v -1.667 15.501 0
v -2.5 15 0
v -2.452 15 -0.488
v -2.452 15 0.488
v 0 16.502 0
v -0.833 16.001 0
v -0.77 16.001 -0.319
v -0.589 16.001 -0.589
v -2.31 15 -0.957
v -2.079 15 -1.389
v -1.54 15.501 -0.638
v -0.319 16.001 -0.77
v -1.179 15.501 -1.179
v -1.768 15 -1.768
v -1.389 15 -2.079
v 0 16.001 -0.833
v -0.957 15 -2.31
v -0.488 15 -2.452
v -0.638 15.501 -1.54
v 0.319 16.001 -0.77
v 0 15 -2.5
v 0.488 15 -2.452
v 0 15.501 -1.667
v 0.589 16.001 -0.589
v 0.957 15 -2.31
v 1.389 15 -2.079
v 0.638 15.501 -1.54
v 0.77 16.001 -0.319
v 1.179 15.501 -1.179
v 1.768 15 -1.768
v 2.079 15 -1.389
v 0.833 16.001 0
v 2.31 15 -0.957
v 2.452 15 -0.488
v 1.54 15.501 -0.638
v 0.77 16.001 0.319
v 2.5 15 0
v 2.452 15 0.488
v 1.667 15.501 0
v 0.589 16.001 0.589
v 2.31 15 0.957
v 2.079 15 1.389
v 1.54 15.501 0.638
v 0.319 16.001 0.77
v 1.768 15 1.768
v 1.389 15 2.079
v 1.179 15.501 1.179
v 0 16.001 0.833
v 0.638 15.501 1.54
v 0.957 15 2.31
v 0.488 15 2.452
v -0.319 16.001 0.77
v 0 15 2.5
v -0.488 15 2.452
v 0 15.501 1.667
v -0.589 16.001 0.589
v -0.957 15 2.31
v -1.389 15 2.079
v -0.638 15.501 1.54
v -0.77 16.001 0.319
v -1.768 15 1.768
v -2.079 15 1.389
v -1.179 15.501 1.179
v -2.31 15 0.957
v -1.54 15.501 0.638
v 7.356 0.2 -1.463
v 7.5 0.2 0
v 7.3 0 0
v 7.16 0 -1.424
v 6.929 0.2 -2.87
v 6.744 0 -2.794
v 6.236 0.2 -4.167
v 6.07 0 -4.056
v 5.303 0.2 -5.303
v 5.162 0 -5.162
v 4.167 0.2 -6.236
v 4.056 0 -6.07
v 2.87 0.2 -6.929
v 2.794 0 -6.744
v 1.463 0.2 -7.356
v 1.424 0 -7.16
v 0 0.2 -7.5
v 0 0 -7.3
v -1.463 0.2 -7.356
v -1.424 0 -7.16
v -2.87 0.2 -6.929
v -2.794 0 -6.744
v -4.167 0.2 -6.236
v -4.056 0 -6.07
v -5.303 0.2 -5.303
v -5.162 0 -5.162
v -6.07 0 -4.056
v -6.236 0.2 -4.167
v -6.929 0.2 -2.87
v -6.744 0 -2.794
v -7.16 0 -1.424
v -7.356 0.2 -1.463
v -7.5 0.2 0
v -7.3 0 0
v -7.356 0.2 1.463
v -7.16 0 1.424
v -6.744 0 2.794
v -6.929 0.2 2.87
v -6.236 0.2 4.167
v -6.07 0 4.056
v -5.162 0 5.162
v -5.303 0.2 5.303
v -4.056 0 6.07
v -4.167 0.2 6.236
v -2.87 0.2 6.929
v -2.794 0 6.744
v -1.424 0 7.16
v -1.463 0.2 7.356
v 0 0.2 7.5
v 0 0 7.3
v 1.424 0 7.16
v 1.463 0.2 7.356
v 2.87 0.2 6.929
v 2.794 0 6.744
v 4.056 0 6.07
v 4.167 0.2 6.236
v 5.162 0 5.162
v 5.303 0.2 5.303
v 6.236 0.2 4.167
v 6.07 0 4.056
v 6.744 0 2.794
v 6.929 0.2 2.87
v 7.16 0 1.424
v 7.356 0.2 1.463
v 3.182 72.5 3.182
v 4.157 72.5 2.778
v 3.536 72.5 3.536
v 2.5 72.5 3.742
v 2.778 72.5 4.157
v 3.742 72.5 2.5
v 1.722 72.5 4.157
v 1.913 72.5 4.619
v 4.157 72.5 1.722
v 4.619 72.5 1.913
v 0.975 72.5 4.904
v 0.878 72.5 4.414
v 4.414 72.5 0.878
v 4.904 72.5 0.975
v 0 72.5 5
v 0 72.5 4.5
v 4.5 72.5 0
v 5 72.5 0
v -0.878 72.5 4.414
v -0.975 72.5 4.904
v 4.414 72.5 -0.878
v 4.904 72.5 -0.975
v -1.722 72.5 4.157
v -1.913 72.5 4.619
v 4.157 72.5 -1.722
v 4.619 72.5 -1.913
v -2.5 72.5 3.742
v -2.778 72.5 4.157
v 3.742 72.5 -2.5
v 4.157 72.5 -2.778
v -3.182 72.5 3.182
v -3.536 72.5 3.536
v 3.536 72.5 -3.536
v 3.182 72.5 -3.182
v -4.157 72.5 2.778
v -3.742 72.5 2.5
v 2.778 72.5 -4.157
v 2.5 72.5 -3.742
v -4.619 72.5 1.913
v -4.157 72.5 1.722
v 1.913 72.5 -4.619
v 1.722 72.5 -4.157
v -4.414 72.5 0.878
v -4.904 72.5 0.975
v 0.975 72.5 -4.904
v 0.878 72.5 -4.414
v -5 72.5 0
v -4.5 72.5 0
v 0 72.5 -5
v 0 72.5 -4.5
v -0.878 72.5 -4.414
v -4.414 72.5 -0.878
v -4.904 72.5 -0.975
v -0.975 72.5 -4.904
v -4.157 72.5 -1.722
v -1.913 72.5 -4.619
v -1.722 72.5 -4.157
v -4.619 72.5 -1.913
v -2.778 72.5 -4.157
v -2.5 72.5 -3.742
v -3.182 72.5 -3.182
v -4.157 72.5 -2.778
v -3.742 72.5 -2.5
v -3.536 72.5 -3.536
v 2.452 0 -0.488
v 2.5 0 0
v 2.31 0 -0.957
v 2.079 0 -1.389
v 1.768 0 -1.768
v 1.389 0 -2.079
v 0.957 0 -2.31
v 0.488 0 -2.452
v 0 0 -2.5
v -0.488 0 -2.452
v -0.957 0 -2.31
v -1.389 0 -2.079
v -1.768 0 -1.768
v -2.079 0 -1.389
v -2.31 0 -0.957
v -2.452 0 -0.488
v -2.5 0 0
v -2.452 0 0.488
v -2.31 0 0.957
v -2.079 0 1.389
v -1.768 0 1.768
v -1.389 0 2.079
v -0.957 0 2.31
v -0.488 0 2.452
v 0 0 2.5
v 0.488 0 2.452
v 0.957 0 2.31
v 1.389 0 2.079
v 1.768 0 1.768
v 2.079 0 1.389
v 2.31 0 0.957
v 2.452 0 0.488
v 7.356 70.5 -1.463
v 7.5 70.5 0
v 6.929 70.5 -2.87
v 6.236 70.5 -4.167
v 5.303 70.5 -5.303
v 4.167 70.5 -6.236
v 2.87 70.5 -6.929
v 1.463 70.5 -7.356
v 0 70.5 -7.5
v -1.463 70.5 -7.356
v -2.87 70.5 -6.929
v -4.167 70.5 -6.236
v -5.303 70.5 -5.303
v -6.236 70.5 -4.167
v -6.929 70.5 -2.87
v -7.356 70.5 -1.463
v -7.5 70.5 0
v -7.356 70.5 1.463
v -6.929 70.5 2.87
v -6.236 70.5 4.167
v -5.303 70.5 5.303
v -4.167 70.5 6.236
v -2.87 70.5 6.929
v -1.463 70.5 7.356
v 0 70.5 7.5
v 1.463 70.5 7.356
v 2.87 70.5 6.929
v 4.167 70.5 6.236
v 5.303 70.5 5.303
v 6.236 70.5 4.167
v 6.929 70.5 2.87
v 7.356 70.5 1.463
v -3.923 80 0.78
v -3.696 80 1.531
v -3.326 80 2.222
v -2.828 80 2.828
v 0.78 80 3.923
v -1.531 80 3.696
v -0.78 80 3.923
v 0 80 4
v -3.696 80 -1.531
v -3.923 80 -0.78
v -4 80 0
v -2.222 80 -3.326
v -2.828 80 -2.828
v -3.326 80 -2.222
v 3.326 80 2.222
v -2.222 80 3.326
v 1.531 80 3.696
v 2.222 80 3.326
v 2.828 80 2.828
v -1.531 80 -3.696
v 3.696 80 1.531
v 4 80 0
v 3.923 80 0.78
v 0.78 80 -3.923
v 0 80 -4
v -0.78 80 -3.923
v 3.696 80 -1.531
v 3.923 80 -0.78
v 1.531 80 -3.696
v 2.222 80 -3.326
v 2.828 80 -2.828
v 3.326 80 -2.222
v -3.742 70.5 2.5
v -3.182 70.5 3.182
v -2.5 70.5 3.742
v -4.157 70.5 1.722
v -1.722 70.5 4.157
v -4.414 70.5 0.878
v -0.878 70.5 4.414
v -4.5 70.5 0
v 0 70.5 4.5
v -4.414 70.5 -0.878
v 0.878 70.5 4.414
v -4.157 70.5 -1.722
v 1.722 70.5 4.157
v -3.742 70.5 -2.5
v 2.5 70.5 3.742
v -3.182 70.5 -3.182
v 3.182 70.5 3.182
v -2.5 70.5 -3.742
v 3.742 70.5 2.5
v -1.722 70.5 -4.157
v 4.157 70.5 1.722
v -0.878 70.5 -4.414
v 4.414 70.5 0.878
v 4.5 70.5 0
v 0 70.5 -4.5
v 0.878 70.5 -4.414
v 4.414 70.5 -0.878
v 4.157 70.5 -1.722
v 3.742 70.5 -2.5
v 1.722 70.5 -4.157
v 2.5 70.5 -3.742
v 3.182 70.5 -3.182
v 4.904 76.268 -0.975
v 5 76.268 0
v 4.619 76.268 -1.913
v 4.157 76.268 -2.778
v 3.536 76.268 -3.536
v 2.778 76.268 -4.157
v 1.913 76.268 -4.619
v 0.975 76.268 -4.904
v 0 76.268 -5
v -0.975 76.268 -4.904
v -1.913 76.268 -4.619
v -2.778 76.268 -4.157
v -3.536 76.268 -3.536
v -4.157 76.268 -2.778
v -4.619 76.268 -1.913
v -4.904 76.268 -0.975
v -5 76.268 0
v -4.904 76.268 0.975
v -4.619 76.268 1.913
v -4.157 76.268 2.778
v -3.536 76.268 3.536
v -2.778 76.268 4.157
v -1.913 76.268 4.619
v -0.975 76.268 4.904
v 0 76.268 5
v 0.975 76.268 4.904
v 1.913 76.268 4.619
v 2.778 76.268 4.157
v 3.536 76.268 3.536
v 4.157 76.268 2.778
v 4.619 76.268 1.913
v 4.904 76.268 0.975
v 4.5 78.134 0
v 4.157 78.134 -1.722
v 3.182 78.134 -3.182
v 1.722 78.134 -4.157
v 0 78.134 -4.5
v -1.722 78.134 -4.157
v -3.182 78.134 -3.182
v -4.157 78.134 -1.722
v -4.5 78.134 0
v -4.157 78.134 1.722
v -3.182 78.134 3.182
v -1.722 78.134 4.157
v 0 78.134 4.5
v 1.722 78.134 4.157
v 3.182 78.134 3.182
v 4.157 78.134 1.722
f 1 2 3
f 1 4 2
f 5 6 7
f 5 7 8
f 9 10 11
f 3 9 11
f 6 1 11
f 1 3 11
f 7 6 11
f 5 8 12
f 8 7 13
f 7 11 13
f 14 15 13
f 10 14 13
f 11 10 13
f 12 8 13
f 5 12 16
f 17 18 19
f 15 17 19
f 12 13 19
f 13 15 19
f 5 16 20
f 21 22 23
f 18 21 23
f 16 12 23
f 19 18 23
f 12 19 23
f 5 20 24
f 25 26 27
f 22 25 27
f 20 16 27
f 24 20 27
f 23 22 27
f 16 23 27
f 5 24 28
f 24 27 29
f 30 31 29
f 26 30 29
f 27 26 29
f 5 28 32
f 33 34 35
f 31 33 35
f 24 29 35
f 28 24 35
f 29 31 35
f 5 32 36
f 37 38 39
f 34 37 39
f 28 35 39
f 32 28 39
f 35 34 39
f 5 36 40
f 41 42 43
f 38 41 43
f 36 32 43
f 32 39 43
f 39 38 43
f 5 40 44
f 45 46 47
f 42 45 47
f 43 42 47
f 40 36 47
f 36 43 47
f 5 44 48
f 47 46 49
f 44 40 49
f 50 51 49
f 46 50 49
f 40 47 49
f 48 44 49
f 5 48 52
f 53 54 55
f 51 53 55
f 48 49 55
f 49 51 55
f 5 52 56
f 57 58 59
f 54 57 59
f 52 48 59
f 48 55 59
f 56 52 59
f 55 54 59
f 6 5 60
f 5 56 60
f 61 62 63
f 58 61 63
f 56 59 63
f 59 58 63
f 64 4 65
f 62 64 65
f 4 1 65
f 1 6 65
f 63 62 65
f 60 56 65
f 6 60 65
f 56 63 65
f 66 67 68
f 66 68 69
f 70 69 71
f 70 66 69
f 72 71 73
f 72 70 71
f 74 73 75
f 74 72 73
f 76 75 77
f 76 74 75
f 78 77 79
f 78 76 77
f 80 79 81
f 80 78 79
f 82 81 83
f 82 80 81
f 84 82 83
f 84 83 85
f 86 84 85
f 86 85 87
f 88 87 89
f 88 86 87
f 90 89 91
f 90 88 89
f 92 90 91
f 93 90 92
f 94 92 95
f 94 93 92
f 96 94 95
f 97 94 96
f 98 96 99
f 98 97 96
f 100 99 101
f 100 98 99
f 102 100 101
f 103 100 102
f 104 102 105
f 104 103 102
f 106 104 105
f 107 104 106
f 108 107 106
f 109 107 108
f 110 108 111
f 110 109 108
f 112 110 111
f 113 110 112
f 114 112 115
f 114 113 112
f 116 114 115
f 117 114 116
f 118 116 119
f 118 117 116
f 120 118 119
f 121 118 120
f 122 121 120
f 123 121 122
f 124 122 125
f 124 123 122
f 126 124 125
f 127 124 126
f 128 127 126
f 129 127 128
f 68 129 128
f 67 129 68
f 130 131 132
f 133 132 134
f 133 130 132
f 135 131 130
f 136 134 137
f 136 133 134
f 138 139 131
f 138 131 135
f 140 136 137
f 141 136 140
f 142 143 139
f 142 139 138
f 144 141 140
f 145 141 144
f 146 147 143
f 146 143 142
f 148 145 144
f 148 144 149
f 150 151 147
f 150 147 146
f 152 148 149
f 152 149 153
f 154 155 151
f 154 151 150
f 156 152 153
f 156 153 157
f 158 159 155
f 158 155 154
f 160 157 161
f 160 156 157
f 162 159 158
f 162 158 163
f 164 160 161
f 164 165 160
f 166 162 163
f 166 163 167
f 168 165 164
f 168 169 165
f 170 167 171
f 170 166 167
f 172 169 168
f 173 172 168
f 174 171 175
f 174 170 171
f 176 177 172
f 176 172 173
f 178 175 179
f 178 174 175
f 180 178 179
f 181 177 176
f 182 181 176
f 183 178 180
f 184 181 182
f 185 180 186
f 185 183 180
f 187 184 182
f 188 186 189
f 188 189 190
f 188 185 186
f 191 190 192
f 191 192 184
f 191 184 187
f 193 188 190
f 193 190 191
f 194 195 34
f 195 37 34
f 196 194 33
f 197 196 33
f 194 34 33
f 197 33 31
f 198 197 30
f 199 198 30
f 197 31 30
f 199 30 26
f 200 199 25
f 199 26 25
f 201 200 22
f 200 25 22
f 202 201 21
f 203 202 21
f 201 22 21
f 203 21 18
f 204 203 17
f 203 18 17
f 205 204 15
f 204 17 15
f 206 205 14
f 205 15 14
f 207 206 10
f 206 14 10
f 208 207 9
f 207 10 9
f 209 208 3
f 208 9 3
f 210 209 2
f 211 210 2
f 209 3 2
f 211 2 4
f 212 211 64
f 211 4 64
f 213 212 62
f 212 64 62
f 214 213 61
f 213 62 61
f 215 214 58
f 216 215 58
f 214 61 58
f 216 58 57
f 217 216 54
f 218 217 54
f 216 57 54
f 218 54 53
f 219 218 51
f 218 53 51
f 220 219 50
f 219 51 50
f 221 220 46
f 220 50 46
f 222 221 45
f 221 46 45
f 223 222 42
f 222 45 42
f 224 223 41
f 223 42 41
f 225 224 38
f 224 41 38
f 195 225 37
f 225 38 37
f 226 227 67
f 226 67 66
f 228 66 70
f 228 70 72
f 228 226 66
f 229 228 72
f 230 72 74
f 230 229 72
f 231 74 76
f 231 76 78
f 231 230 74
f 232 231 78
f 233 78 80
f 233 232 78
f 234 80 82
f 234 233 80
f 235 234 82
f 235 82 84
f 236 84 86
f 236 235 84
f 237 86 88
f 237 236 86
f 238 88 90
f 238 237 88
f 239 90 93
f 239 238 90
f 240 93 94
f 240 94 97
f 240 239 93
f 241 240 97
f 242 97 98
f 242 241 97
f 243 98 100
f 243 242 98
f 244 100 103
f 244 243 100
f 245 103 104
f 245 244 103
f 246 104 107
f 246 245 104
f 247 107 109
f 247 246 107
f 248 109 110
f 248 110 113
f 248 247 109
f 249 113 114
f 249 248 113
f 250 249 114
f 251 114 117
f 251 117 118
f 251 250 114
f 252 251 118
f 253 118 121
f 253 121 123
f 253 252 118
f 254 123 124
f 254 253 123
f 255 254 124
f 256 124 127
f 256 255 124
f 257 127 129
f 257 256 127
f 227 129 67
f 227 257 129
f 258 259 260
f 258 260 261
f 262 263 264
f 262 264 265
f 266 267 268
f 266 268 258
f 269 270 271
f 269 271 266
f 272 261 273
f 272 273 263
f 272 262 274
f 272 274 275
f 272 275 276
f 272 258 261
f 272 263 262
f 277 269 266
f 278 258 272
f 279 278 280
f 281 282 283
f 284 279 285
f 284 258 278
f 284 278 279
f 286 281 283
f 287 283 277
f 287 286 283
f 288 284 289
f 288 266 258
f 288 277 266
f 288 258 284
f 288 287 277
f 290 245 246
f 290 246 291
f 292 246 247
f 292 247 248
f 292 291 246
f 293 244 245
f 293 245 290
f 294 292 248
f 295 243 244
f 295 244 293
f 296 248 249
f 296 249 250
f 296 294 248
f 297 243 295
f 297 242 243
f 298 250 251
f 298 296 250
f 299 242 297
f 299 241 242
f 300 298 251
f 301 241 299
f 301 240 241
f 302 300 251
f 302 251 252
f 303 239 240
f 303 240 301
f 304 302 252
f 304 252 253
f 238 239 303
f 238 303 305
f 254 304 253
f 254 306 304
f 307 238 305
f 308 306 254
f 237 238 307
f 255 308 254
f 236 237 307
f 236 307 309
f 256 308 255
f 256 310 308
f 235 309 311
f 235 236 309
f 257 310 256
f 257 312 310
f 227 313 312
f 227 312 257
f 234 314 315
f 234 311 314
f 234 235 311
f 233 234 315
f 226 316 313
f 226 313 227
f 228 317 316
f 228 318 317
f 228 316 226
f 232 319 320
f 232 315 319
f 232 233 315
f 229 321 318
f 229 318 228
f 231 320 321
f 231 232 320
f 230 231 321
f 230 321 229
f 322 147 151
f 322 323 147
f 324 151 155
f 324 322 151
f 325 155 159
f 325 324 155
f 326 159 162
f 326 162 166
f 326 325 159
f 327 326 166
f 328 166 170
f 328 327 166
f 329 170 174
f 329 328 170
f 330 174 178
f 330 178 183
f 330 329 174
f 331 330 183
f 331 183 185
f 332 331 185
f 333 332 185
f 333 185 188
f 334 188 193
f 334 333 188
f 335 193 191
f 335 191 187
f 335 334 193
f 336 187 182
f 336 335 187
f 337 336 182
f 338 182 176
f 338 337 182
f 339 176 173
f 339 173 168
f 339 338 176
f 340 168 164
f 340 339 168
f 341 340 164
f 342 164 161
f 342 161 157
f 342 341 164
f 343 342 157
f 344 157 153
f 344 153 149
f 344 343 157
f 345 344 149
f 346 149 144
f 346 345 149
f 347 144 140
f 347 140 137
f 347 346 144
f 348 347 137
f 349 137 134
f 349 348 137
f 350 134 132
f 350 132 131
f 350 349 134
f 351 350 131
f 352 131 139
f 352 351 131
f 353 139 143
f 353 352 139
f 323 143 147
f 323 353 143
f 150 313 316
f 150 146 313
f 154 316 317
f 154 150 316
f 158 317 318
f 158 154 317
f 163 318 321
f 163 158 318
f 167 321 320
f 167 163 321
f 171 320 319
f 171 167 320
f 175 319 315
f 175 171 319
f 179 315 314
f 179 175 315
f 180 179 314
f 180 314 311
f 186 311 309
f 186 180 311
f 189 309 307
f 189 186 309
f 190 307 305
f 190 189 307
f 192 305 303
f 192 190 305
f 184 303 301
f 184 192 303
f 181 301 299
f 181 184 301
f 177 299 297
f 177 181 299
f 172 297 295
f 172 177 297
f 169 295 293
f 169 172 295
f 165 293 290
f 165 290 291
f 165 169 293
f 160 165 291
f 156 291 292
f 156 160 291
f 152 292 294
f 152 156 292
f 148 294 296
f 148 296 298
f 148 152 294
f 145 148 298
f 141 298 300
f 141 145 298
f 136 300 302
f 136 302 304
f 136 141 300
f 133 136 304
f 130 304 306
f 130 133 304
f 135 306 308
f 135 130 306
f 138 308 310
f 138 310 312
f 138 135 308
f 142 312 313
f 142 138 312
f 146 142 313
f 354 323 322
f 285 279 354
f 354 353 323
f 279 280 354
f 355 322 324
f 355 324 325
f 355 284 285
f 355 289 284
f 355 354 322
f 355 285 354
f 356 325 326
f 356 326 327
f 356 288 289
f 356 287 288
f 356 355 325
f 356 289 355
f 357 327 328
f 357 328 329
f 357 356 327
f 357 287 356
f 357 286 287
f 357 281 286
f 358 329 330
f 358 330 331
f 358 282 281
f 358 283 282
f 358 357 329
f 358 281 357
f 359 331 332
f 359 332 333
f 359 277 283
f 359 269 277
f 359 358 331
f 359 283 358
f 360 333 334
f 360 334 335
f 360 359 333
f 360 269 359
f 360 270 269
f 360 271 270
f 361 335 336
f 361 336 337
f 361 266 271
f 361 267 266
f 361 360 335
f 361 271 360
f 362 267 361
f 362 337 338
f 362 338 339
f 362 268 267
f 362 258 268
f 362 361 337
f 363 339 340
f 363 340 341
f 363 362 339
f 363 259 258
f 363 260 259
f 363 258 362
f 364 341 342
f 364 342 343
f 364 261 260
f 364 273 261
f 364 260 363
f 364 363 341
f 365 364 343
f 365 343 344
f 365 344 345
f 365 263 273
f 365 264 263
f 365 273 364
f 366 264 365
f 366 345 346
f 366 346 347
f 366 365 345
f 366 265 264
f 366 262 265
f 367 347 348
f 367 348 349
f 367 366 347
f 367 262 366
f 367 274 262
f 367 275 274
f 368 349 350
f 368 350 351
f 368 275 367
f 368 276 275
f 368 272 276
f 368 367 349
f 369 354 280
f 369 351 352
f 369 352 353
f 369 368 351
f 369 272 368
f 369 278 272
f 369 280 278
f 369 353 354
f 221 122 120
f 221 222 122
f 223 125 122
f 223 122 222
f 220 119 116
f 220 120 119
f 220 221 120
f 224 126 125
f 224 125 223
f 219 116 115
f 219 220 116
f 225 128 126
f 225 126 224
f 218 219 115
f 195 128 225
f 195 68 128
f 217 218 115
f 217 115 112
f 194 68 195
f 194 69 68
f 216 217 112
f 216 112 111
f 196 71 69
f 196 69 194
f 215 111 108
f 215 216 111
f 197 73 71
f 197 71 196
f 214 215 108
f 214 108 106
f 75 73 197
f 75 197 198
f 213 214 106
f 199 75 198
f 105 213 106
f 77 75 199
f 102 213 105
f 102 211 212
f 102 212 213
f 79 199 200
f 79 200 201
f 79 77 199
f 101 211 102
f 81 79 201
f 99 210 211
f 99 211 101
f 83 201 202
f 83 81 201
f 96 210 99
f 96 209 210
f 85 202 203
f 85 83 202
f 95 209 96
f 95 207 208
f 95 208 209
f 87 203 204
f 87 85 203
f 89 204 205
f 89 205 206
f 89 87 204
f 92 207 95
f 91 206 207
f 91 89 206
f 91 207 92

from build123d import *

# Parameters (mm, degrees)
HOLE_WIZARD_M6_1_D     = 5
HOLE_WIZARD_M6_1_DEPTH = 15
HOLE_WIZARD_M6_1_TIP   = 1.502151548
CHAMFER_1_SIZE         = 0.2


with BuildPart() as part:
    # 草图1 → 旋转1 (revolve)
    with BuildSketch(Plane.XY):
        Polygon((0, 0), (7.5, 0), (7.5, 70.5), (4.5, 70.5), (4.5, 72.5), (5, 72.5), (5, 76.267949192), (4, 80), (0, 80), align=None)
    revolve(axis=Axis((0, -1000, 0), (0, 1, 0)))

    # M6 螺纹孔1
    with Locations(Plane(origin=(0, 0, 0), x_dir=(-1, 0, 0), z_dir=(0, -1, 0))):
        with Locations((0, 0)):
            Hole(HOLE_WIZARD_M6_1_D / 2, depth=HOLE_WIZARD_M6_1_DEPTH)
            with Locations((0, 0, -(HOLE_WIZARD_M6_1_DEPTH + HOLE_WIZARD_M6_1_TIP / 2))):  # 118° drill point
                Cone(0, HOLE_WIZARD_M6_1_D / 2, HOLE_WIZARD_M6_1_TIP, mode=Mode.SUBTRACT)

    # 倒角1
    chamfer_1_edges = [part.edges().sort_by_distance(p)[0] for p in [
        (-7.5, 0, 0),
    ]]
    chamfer(chamfer_1_edges, length=CHAMFER_1_SIZE)


solid = part.part
